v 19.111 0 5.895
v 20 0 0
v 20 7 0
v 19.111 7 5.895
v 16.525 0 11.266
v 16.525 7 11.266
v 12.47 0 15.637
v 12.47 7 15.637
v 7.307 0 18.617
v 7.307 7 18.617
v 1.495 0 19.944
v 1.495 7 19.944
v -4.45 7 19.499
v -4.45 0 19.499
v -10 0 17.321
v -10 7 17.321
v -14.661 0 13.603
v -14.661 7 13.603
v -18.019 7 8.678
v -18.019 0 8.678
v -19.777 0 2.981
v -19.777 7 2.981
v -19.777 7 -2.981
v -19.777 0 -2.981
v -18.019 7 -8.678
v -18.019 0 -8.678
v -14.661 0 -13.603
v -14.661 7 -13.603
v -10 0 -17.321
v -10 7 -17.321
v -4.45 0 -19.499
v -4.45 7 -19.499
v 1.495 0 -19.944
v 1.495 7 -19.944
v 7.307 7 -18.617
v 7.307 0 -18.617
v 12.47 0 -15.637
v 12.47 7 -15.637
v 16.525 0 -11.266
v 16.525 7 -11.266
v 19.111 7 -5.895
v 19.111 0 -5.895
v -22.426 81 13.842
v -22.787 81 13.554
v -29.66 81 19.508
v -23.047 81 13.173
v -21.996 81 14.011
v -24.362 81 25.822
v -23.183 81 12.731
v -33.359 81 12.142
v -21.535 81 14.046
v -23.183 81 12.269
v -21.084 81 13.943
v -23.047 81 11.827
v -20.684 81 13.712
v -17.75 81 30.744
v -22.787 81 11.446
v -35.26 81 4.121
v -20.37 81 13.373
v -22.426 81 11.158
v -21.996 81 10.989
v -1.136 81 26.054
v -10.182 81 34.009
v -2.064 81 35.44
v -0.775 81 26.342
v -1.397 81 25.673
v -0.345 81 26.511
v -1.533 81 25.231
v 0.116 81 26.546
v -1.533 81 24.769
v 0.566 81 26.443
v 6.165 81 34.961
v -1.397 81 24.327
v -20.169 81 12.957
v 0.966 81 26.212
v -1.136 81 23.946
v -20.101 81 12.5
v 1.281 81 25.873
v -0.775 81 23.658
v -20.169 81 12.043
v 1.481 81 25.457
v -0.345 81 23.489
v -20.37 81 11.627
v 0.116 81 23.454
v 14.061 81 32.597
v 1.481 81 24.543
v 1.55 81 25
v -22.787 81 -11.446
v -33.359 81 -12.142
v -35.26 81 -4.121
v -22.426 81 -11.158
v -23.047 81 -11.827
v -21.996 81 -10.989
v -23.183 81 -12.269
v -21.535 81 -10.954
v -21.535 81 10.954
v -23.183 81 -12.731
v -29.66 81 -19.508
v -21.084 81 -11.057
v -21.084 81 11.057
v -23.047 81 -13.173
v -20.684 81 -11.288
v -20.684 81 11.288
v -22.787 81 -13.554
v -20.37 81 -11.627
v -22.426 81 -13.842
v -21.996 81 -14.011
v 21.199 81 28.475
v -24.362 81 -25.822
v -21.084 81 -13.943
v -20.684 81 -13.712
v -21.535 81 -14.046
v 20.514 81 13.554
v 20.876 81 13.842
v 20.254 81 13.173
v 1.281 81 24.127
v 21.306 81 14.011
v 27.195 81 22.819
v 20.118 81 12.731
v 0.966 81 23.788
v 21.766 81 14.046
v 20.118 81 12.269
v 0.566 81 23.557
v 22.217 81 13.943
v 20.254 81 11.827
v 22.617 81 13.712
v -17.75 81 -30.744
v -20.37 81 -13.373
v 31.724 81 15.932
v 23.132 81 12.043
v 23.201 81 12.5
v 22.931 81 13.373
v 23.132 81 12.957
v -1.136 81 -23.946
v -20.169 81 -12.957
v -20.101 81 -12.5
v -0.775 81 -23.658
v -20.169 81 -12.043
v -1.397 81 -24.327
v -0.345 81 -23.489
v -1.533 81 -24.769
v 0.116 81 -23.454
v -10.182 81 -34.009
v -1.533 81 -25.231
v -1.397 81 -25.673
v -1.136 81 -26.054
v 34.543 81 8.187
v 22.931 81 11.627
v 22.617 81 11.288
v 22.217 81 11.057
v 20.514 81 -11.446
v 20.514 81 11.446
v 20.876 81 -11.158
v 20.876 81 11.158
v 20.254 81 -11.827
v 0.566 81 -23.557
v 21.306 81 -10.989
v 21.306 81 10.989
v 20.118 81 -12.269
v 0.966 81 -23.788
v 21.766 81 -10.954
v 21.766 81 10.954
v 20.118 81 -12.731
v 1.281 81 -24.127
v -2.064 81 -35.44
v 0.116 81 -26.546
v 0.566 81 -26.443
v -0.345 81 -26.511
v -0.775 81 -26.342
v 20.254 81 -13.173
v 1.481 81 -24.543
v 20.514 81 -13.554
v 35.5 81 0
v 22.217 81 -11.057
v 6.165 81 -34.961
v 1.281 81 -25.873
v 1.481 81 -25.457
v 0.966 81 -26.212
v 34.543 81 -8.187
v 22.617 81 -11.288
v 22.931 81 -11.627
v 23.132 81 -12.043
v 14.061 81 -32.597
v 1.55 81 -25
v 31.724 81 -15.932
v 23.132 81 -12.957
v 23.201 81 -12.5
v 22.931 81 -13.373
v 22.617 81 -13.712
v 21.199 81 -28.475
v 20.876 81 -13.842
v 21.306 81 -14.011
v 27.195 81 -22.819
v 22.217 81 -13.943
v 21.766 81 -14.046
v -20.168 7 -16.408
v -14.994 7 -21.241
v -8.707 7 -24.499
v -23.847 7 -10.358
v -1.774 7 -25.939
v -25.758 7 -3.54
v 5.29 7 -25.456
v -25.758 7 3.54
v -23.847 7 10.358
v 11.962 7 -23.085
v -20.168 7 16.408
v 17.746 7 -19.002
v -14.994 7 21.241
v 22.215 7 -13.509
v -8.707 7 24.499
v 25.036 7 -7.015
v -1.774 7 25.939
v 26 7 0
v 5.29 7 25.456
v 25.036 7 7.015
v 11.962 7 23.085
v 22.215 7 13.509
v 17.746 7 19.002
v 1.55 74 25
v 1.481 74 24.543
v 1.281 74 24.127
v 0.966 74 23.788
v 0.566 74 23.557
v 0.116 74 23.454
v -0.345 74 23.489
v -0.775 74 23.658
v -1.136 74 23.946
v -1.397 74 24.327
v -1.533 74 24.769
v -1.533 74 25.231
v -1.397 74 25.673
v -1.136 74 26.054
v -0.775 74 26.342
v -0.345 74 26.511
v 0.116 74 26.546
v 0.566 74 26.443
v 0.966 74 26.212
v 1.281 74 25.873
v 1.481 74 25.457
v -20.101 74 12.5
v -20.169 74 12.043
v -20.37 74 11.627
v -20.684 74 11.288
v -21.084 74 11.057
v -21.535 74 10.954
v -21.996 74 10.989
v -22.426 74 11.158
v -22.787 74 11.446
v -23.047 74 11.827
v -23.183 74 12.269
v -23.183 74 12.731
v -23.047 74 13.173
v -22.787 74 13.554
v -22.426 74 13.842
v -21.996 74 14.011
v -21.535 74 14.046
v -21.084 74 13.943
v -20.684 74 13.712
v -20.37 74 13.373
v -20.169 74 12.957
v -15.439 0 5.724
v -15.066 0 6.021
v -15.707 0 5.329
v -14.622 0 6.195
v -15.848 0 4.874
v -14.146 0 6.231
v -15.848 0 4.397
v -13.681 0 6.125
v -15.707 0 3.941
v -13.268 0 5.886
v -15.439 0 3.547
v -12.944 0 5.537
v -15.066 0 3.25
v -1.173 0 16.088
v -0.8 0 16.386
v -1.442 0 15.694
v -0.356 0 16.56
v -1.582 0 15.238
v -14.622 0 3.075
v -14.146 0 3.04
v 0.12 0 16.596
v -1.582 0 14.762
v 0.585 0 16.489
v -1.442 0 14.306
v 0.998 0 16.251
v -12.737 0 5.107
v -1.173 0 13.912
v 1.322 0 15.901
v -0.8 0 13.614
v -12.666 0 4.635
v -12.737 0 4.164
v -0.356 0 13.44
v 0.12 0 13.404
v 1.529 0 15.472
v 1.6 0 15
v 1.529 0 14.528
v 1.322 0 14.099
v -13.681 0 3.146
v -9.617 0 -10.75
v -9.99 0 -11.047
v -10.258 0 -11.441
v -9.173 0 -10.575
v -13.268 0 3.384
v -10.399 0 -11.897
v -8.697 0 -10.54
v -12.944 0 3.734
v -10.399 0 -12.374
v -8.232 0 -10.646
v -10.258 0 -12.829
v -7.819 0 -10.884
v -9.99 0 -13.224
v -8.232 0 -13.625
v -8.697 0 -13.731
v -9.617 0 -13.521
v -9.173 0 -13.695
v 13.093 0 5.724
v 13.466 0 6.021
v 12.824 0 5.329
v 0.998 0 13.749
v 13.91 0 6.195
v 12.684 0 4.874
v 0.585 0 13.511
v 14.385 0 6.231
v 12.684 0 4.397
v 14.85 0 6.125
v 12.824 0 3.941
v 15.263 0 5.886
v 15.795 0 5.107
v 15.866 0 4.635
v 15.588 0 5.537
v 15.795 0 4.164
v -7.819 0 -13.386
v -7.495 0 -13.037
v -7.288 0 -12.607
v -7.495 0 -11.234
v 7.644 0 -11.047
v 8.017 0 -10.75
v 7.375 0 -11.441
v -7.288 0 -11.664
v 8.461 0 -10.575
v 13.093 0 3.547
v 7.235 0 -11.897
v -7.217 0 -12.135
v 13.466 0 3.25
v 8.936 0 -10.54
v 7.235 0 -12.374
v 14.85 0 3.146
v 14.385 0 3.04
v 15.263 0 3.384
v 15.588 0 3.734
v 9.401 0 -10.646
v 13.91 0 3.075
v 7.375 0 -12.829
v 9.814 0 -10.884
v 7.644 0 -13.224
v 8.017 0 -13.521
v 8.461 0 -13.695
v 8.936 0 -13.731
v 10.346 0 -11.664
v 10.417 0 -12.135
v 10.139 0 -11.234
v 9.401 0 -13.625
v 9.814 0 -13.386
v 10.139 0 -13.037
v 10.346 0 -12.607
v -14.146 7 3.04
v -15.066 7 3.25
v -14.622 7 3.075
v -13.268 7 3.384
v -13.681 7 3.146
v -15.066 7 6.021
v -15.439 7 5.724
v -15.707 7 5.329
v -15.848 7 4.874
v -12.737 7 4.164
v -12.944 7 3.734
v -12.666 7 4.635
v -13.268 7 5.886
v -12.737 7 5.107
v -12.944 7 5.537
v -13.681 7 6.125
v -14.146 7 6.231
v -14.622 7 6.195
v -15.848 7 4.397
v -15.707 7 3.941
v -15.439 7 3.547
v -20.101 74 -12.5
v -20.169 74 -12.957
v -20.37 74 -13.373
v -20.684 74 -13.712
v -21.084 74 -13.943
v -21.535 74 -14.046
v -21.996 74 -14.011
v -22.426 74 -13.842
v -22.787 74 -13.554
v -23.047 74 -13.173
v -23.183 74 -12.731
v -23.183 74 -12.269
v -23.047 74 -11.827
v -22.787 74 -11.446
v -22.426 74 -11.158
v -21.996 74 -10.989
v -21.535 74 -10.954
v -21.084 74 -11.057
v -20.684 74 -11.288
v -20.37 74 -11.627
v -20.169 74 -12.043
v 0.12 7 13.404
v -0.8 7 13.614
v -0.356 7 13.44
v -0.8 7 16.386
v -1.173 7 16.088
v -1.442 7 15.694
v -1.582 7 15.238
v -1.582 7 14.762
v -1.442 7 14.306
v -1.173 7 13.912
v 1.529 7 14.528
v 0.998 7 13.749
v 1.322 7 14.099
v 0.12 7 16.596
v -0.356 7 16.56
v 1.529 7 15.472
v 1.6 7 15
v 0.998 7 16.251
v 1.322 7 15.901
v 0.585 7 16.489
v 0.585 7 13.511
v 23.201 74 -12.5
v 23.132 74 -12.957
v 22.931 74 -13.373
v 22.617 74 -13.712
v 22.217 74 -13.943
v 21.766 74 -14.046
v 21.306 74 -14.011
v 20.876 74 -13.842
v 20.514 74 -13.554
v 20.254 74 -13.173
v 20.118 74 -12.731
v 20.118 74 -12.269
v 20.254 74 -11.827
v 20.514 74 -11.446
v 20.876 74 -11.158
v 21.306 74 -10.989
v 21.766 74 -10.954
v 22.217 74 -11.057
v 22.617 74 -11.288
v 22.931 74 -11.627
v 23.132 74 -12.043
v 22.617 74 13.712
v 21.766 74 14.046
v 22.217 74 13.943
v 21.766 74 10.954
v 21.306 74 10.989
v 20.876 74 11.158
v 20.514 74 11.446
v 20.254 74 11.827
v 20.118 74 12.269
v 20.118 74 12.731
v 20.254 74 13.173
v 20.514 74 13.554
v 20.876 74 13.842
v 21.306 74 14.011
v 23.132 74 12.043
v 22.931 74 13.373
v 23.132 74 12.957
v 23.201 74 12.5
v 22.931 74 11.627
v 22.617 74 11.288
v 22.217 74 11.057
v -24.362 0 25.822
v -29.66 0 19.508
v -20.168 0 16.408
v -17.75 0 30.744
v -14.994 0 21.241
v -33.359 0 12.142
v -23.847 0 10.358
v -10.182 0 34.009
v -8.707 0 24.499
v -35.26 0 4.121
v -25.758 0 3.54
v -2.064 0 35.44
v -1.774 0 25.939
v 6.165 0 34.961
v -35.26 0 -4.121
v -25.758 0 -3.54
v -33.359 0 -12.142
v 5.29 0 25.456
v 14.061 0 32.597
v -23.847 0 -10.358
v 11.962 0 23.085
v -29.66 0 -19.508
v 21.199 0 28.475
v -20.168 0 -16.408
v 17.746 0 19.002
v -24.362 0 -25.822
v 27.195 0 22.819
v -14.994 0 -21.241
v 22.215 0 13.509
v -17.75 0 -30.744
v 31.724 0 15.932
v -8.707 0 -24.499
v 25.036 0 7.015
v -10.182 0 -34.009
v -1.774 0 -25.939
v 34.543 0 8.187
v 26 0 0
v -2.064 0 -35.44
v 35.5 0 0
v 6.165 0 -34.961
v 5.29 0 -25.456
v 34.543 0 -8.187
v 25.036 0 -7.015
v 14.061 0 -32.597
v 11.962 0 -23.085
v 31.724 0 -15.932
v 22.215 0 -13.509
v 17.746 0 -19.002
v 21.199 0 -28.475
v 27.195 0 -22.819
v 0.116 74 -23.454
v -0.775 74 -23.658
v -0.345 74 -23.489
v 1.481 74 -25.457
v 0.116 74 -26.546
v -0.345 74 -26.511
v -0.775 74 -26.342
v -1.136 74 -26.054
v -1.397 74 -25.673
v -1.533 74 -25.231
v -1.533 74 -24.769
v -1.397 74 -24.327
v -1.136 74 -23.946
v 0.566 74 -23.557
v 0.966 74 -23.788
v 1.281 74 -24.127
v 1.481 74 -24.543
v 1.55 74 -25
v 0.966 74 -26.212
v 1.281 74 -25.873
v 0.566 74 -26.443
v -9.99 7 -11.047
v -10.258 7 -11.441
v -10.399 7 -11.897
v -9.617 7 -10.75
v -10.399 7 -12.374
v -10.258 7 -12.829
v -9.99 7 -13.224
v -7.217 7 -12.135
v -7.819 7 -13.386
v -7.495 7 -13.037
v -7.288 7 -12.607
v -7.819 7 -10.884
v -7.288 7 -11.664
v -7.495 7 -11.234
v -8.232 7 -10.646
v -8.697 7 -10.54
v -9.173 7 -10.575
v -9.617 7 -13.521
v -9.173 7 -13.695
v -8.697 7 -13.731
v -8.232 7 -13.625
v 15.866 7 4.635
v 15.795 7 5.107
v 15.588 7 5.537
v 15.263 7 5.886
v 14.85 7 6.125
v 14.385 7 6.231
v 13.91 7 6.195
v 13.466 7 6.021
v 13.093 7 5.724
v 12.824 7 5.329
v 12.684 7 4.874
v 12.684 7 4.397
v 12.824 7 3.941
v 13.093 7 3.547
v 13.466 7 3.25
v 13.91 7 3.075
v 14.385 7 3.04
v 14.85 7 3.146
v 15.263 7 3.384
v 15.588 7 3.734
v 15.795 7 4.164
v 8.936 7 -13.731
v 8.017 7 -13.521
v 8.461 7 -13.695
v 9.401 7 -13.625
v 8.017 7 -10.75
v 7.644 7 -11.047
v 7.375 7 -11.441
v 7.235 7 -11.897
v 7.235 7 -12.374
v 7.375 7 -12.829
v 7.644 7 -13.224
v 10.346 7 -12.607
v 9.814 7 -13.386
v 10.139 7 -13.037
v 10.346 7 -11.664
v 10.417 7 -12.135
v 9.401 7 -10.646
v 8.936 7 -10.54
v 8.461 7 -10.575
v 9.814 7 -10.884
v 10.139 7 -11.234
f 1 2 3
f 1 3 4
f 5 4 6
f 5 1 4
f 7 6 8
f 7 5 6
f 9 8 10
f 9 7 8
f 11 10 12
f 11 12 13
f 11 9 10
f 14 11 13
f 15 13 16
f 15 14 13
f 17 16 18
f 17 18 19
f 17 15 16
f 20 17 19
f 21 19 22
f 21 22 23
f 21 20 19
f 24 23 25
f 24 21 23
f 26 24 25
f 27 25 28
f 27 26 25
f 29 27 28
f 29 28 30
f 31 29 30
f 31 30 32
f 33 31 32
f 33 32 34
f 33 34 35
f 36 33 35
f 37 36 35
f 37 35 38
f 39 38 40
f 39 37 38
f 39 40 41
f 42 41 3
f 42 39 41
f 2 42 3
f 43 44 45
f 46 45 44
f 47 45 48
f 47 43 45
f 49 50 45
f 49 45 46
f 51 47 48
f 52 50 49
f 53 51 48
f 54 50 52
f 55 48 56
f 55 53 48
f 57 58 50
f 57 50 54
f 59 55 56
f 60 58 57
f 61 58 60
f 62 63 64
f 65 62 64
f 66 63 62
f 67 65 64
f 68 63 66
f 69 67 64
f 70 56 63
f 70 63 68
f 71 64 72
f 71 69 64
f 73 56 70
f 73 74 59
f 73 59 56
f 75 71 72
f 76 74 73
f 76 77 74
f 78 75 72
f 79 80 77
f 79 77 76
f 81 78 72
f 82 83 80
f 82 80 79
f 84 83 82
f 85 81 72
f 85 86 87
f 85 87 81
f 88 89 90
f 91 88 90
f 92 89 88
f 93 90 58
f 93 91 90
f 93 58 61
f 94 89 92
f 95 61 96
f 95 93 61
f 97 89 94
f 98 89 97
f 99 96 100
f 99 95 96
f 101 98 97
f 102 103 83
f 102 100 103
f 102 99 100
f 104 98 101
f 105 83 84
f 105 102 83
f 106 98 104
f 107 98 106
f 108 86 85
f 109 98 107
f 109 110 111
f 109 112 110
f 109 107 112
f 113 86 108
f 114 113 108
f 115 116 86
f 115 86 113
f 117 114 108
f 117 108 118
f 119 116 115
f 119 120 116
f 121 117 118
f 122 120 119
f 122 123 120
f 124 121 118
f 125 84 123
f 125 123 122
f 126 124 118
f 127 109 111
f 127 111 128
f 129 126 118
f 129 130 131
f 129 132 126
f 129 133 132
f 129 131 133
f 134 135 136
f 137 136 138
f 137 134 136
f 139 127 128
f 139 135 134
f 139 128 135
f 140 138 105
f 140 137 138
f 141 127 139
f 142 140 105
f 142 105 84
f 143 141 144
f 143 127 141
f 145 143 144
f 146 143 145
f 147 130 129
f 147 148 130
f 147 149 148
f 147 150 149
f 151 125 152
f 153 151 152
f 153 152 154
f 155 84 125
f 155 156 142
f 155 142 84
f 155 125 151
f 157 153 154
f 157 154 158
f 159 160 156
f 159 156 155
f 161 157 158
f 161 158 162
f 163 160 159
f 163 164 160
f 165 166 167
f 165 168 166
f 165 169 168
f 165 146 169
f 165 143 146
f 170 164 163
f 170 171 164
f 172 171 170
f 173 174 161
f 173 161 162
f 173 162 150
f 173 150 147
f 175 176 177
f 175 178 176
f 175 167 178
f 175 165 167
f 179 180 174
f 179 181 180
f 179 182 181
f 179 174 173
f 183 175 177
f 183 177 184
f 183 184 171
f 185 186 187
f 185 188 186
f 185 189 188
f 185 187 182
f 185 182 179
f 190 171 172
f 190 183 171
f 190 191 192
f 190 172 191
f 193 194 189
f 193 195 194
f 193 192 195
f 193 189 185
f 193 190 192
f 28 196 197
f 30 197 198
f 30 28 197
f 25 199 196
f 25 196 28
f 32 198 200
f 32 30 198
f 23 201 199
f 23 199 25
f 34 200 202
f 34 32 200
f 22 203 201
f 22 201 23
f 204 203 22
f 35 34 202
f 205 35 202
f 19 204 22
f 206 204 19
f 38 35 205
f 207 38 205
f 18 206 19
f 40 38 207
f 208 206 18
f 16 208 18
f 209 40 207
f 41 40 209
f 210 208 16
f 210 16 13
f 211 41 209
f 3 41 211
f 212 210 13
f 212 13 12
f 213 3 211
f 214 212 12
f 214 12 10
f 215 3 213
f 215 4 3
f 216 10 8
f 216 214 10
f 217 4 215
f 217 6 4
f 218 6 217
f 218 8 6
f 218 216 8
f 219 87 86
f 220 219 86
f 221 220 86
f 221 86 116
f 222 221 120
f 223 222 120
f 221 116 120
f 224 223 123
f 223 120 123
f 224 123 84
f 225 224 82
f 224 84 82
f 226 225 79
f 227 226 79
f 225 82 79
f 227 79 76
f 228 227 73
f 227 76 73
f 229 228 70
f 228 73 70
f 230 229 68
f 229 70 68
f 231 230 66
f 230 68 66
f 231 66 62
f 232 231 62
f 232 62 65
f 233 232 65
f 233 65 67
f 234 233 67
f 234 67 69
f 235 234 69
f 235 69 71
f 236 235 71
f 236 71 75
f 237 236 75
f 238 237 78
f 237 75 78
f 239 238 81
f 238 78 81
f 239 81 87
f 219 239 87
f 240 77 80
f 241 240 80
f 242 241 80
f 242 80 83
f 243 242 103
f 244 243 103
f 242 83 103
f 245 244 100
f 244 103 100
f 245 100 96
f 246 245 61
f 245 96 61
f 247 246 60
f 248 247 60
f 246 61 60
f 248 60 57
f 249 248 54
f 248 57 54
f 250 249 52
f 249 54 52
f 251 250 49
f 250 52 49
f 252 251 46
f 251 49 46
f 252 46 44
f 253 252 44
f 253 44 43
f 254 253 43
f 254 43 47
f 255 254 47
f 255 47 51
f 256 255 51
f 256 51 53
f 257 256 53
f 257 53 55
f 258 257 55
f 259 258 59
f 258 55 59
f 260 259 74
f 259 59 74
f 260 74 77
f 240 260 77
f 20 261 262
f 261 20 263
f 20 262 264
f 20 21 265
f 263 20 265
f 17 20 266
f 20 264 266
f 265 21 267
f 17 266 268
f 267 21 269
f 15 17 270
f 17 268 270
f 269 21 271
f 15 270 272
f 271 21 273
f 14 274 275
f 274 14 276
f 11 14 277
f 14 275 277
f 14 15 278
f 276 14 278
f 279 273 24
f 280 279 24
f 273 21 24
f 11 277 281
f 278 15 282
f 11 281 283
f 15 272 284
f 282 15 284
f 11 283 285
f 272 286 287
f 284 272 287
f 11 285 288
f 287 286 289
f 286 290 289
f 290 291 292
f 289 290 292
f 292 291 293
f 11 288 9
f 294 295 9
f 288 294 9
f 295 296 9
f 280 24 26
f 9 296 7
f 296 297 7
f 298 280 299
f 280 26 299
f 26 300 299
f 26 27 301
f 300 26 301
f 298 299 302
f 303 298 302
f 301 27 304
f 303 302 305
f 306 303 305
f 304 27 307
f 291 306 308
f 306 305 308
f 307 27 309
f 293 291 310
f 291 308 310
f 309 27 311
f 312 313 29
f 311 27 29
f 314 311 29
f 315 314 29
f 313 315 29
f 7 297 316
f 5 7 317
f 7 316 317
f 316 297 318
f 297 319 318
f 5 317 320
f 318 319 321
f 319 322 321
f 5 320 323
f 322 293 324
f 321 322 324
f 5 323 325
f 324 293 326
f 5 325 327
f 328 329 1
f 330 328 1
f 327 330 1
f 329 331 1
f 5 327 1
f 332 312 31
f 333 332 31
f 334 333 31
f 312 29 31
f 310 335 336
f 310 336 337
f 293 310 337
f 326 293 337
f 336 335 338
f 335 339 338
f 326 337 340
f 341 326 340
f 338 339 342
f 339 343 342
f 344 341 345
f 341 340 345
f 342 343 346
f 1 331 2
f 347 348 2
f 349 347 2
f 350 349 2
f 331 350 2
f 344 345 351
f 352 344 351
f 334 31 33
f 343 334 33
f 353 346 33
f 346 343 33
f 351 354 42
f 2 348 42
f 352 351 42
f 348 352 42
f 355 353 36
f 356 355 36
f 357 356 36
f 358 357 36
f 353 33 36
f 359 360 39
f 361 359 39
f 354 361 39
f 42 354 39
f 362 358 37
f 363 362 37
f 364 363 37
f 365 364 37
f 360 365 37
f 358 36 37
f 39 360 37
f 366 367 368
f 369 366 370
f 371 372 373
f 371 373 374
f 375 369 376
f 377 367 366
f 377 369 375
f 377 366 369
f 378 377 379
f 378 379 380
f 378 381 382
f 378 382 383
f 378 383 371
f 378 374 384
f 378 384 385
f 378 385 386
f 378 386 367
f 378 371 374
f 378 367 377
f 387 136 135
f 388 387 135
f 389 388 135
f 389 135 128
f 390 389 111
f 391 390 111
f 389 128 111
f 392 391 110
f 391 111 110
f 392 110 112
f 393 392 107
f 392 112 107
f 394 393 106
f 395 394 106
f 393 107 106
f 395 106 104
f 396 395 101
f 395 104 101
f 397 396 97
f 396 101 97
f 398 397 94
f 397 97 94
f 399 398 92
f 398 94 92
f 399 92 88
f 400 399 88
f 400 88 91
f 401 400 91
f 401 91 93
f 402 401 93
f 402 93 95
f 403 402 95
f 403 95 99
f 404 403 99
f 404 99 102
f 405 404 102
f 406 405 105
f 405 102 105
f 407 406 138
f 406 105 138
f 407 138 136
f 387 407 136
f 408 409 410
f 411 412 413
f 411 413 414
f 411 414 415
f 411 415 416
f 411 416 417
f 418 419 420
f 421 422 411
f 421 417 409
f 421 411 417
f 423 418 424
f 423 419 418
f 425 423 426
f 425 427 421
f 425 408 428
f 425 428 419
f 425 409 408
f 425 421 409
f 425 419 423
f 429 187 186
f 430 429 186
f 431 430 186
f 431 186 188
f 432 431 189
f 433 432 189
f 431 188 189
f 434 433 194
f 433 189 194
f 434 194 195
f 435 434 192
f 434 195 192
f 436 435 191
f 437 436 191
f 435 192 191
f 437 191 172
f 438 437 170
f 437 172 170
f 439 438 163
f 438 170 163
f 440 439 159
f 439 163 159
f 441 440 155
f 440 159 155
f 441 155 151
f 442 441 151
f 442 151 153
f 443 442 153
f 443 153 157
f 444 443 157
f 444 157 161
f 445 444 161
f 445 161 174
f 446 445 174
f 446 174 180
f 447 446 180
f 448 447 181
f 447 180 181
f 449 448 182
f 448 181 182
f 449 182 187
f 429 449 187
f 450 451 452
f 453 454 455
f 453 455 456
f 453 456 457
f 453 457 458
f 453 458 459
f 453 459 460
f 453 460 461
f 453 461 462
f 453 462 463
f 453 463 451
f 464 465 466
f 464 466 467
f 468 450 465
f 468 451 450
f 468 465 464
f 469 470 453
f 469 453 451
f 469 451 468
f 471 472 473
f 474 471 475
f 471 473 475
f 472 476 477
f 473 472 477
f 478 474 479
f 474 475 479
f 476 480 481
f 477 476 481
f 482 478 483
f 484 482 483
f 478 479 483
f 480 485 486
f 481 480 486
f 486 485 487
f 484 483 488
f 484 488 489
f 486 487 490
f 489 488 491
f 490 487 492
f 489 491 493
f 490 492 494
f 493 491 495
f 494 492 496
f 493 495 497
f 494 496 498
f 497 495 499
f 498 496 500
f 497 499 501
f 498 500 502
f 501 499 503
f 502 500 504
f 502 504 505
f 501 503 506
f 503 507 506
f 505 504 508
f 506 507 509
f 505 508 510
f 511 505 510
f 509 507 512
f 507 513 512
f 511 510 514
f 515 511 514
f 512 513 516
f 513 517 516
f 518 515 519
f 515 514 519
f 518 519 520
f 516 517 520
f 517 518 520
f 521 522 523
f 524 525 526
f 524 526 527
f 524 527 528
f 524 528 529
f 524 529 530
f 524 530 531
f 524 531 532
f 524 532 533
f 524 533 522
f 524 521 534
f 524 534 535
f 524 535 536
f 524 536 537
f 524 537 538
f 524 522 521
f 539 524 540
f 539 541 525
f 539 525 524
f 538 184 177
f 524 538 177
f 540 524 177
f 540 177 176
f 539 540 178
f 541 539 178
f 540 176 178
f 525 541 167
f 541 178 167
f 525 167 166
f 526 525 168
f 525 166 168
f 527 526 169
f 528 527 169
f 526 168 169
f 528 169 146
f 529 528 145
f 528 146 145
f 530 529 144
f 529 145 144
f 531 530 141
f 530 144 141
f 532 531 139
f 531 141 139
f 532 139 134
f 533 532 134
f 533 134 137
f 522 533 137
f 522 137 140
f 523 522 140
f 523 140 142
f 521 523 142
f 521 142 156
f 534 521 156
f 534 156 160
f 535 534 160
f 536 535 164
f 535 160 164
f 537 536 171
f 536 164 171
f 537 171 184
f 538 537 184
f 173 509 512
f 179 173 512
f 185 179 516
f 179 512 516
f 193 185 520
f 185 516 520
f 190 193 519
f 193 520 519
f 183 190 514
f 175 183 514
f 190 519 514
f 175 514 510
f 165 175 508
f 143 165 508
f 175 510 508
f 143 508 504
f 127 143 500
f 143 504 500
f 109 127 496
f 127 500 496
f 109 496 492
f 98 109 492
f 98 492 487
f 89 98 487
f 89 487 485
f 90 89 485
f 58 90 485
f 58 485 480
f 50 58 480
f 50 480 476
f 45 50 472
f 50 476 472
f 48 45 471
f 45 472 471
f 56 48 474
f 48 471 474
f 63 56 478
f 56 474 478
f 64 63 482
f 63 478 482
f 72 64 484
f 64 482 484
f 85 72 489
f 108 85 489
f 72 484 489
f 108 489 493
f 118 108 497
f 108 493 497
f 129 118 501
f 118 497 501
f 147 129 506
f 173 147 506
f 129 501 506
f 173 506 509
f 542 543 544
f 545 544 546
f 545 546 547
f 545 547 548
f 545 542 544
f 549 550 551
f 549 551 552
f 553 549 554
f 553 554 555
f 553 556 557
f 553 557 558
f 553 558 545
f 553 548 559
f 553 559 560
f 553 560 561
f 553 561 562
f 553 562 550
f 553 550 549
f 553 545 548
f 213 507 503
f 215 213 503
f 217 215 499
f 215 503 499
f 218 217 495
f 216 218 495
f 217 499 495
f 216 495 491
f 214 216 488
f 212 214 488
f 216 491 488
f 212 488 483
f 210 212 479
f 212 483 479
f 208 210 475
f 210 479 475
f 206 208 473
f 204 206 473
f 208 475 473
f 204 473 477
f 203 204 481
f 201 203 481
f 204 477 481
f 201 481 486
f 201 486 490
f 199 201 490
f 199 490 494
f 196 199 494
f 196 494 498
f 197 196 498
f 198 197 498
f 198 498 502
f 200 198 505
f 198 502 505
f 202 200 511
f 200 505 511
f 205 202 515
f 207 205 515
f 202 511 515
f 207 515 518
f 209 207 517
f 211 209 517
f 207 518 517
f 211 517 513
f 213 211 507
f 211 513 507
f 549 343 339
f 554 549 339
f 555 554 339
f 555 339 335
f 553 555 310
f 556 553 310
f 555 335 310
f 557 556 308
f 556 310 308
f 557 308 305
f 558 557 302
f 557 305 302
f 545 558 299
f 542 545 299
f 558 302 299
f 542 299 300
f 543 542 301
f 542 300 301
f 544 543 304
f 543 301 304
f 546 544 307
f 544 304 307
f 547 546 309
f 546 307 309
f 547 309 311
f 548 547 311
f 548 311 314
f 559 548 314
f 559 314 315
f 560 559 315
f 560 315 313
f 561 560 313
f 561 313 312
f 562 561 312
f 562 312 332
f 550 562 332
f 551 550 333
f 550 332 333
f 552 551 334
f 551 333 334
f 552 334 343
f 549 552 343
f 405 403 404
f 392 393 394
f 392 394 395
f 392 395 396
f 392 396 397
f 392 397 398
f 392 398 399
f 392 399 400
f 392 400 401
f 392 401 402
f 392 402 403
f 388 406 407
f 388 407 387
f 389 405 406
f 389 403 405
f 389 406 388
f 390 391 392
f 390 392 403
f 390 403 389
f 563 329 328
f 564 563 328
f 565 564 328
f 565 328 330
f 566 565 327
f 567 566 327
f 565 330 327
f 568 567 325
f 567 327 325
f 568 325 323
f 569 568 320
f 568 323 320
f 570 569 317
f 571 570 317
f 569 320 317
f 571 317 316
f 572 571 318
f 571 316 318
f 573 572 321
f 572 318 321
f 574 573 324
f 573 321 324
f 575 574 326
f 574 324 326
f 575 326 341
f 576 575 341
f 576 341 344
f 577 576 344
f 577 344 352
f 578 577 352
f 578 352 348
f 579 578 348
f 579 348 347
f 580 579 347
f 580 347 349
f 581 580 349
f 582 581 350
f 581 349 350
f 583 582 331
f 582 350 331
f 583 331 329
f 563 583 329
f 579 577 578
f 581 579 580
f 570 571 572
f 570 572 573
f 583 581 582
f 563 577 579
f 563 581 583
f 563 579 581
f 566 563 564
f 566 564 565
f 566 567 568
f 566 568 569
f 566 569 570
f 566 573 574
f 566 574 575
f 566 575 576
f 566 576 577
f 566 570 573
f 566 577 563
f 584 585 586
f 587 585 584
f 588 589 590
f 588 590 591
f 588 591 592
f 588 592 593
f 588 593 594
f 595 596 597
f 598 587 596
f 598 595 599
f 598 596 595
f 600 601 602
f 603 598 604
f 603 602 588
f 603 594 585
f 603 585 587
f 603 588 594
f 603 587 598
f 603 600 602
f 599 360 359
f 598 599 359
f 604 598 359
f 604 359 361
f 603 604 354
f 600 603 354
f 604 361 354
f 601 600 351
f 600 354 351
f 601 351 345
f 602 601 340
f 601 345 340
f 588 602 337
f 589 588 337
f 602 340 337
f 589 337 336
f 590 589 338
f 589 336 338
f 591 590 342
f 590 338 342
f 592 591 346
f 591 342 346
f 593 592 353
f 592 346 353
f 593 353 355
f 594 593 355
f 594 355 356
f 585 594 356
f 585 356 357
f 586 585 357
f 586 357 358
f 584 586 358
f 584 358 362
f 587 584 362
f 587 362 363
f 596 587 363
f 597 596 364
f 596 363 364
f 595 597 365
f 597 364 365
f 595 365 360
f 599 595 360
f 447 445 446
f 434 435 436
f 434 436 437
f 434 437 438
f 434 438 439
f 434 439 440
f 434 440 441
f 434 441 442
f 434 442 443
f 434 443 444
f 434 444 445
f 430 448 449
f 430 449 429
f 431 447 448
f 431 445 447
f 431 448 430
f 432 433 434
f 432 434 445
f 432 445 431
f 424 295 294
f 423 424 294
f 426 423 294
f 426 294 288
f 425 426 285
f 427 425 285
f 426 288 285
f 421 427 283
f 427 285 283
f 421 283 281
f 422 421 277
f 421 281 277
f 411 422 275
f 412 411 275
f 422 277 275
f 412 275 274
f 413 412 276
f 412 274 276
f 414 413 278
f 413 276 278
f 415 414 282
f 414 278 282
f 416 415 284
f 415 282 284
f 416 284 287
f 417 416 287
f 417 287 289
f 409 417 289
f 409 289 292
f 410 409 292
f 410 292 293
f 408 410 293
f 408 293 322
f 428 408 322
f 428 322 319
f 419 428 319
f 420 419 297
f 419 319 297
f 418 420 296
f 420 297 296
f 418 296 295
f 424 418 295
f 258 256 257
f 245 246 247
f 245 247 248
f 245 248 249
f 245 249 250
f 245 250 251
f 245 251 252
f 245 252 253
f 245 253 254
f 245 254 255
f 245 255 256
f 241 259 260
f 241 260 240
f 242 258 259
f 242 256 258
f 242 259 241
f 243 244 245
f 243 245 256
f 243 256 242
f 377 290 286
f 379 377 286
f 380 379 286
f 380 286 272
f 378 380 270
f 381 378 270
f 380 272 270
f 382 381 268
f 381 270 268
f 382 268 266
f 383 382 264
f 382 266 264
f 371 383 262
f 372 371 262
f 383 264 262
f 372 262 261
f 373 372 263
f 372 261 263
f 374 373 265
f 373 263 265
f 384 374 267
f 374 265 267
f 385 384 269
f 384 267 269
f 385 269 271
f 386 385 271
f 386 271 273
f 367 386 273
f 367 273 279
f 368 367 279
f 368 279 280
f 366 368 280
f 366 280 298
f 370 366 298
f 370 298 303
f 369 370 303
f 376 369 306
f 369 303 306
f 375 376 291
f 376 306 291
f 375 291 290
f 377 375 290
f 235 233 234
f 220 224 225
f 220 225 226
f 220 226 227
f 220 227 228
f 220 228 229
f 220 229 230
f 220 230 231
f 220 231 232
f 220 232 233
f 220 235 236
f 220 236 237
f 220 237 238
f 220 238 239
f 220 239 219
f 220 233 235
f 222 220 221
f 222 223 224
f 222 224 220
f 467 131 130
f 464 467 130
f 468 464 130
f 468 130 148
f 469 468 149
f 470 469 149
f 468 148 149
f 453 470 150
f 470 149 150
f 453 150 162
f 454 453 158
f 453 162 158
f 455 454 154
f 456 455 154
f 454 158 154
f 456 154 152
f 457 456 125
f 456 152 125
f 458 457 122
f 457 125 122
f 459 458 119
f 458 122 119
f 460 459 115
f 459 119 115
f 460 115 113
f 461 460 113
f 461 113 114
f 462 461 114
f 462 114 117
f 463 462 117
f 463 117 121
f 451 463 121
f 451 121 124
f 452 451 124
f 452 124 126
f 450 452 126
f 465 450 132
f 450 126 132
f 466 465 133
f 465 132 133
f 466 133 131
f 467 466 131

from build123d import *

# Parameters (mm, degrees)
CROQUIS1_R              = 35.5
SALIENTE_EXTRUIR1_DEPTH = 81
CROQUIS2_R              = 26
CROQUIS2_R_2            = 20
CORTAR_EXTRUIR1_DEPTH   = 7
CROQUIS3_R              = 1.6
CORTAR_EXTRUIR2_DEPTH   = 7
CROQUIS4_R              = 1.55
CORTAR_EXTRUIR3_DEPTH   = 7


with BuildPart() as part:
    # Croquis1 → Saliente-Extruir1 (new body)
    with BuildSketch(Plane(origin=(0, 0, 0), x_dir=(1, 0, 0), z_dir=(0, 1, 0))):
        Circle(CROQUIS1_R)
    extrude(amount=SALIENTE_EXTRUIR1_DEPTH)

    # Croquis2 → Cortar-Extruir1 (cut)
    with BuildSketch(Plane.XZ):
        Circle(CROQUIS2_R)
        Circle(CROQUIS2_R_2, mode=Mode.SUBTRACT)
    extrude(amount=-CORTAR_EXTRUIR1_DEPTH, mode=Mode.SUBTRACT)

    # Croquis3 → Cortar-Extruir2 (cut)
    with BuildSketch(Plane.XZ):
        with Locations((0, 15)):
            Circle(CROQUIS3_R)
        with Locations((14.265847744, 4.635254916)):
            Circle(CROQUIS3_R)
        with Locations((8.816778784, -12.135254916)):
            Circle(CROQUIS3_R)
        with Locations((-8.816778784, -12.135254916)):
            Circle(CROQUIS3_R)
        with Locations((-14.265847744, 4.635254916)):
            Circle(CROQUIS3_R)
    extrude(amount=-CORTAR_EXTRUIR2_DEPTH, mode=Mode.SUBTRACT)

    # Croquis4 → Cortar-Extruir3 (cut)
    with BuildSketch(Plane(origin=(0, 81, 0), x_dir=(1, 0, 0), z_dir=(0, 1, 0))):
        with Locations((0, 25)):
            Circle(CROQUIS4_R)
        with Locations((21.650635095, 12.5)):
            Circle(CROQUIS4_R)
        with Locations((21.650635095, -12.5)):
            Circle(CROQUIS4_R)
        with Locations((0, -25)):
            Circle(CROQUIS4_R)
        with Locations((-21.650635095, -12.5)):
            Circle(CROQUIS4_R)
        with Locations((-21.650635095, 12.5)):
            Circle(CROQUIS4_R)
    extrude(amount=-CORTAR_EXTRUIR3_DEPTH, mode=Mode.SUBTRACT)


solid = part.part
